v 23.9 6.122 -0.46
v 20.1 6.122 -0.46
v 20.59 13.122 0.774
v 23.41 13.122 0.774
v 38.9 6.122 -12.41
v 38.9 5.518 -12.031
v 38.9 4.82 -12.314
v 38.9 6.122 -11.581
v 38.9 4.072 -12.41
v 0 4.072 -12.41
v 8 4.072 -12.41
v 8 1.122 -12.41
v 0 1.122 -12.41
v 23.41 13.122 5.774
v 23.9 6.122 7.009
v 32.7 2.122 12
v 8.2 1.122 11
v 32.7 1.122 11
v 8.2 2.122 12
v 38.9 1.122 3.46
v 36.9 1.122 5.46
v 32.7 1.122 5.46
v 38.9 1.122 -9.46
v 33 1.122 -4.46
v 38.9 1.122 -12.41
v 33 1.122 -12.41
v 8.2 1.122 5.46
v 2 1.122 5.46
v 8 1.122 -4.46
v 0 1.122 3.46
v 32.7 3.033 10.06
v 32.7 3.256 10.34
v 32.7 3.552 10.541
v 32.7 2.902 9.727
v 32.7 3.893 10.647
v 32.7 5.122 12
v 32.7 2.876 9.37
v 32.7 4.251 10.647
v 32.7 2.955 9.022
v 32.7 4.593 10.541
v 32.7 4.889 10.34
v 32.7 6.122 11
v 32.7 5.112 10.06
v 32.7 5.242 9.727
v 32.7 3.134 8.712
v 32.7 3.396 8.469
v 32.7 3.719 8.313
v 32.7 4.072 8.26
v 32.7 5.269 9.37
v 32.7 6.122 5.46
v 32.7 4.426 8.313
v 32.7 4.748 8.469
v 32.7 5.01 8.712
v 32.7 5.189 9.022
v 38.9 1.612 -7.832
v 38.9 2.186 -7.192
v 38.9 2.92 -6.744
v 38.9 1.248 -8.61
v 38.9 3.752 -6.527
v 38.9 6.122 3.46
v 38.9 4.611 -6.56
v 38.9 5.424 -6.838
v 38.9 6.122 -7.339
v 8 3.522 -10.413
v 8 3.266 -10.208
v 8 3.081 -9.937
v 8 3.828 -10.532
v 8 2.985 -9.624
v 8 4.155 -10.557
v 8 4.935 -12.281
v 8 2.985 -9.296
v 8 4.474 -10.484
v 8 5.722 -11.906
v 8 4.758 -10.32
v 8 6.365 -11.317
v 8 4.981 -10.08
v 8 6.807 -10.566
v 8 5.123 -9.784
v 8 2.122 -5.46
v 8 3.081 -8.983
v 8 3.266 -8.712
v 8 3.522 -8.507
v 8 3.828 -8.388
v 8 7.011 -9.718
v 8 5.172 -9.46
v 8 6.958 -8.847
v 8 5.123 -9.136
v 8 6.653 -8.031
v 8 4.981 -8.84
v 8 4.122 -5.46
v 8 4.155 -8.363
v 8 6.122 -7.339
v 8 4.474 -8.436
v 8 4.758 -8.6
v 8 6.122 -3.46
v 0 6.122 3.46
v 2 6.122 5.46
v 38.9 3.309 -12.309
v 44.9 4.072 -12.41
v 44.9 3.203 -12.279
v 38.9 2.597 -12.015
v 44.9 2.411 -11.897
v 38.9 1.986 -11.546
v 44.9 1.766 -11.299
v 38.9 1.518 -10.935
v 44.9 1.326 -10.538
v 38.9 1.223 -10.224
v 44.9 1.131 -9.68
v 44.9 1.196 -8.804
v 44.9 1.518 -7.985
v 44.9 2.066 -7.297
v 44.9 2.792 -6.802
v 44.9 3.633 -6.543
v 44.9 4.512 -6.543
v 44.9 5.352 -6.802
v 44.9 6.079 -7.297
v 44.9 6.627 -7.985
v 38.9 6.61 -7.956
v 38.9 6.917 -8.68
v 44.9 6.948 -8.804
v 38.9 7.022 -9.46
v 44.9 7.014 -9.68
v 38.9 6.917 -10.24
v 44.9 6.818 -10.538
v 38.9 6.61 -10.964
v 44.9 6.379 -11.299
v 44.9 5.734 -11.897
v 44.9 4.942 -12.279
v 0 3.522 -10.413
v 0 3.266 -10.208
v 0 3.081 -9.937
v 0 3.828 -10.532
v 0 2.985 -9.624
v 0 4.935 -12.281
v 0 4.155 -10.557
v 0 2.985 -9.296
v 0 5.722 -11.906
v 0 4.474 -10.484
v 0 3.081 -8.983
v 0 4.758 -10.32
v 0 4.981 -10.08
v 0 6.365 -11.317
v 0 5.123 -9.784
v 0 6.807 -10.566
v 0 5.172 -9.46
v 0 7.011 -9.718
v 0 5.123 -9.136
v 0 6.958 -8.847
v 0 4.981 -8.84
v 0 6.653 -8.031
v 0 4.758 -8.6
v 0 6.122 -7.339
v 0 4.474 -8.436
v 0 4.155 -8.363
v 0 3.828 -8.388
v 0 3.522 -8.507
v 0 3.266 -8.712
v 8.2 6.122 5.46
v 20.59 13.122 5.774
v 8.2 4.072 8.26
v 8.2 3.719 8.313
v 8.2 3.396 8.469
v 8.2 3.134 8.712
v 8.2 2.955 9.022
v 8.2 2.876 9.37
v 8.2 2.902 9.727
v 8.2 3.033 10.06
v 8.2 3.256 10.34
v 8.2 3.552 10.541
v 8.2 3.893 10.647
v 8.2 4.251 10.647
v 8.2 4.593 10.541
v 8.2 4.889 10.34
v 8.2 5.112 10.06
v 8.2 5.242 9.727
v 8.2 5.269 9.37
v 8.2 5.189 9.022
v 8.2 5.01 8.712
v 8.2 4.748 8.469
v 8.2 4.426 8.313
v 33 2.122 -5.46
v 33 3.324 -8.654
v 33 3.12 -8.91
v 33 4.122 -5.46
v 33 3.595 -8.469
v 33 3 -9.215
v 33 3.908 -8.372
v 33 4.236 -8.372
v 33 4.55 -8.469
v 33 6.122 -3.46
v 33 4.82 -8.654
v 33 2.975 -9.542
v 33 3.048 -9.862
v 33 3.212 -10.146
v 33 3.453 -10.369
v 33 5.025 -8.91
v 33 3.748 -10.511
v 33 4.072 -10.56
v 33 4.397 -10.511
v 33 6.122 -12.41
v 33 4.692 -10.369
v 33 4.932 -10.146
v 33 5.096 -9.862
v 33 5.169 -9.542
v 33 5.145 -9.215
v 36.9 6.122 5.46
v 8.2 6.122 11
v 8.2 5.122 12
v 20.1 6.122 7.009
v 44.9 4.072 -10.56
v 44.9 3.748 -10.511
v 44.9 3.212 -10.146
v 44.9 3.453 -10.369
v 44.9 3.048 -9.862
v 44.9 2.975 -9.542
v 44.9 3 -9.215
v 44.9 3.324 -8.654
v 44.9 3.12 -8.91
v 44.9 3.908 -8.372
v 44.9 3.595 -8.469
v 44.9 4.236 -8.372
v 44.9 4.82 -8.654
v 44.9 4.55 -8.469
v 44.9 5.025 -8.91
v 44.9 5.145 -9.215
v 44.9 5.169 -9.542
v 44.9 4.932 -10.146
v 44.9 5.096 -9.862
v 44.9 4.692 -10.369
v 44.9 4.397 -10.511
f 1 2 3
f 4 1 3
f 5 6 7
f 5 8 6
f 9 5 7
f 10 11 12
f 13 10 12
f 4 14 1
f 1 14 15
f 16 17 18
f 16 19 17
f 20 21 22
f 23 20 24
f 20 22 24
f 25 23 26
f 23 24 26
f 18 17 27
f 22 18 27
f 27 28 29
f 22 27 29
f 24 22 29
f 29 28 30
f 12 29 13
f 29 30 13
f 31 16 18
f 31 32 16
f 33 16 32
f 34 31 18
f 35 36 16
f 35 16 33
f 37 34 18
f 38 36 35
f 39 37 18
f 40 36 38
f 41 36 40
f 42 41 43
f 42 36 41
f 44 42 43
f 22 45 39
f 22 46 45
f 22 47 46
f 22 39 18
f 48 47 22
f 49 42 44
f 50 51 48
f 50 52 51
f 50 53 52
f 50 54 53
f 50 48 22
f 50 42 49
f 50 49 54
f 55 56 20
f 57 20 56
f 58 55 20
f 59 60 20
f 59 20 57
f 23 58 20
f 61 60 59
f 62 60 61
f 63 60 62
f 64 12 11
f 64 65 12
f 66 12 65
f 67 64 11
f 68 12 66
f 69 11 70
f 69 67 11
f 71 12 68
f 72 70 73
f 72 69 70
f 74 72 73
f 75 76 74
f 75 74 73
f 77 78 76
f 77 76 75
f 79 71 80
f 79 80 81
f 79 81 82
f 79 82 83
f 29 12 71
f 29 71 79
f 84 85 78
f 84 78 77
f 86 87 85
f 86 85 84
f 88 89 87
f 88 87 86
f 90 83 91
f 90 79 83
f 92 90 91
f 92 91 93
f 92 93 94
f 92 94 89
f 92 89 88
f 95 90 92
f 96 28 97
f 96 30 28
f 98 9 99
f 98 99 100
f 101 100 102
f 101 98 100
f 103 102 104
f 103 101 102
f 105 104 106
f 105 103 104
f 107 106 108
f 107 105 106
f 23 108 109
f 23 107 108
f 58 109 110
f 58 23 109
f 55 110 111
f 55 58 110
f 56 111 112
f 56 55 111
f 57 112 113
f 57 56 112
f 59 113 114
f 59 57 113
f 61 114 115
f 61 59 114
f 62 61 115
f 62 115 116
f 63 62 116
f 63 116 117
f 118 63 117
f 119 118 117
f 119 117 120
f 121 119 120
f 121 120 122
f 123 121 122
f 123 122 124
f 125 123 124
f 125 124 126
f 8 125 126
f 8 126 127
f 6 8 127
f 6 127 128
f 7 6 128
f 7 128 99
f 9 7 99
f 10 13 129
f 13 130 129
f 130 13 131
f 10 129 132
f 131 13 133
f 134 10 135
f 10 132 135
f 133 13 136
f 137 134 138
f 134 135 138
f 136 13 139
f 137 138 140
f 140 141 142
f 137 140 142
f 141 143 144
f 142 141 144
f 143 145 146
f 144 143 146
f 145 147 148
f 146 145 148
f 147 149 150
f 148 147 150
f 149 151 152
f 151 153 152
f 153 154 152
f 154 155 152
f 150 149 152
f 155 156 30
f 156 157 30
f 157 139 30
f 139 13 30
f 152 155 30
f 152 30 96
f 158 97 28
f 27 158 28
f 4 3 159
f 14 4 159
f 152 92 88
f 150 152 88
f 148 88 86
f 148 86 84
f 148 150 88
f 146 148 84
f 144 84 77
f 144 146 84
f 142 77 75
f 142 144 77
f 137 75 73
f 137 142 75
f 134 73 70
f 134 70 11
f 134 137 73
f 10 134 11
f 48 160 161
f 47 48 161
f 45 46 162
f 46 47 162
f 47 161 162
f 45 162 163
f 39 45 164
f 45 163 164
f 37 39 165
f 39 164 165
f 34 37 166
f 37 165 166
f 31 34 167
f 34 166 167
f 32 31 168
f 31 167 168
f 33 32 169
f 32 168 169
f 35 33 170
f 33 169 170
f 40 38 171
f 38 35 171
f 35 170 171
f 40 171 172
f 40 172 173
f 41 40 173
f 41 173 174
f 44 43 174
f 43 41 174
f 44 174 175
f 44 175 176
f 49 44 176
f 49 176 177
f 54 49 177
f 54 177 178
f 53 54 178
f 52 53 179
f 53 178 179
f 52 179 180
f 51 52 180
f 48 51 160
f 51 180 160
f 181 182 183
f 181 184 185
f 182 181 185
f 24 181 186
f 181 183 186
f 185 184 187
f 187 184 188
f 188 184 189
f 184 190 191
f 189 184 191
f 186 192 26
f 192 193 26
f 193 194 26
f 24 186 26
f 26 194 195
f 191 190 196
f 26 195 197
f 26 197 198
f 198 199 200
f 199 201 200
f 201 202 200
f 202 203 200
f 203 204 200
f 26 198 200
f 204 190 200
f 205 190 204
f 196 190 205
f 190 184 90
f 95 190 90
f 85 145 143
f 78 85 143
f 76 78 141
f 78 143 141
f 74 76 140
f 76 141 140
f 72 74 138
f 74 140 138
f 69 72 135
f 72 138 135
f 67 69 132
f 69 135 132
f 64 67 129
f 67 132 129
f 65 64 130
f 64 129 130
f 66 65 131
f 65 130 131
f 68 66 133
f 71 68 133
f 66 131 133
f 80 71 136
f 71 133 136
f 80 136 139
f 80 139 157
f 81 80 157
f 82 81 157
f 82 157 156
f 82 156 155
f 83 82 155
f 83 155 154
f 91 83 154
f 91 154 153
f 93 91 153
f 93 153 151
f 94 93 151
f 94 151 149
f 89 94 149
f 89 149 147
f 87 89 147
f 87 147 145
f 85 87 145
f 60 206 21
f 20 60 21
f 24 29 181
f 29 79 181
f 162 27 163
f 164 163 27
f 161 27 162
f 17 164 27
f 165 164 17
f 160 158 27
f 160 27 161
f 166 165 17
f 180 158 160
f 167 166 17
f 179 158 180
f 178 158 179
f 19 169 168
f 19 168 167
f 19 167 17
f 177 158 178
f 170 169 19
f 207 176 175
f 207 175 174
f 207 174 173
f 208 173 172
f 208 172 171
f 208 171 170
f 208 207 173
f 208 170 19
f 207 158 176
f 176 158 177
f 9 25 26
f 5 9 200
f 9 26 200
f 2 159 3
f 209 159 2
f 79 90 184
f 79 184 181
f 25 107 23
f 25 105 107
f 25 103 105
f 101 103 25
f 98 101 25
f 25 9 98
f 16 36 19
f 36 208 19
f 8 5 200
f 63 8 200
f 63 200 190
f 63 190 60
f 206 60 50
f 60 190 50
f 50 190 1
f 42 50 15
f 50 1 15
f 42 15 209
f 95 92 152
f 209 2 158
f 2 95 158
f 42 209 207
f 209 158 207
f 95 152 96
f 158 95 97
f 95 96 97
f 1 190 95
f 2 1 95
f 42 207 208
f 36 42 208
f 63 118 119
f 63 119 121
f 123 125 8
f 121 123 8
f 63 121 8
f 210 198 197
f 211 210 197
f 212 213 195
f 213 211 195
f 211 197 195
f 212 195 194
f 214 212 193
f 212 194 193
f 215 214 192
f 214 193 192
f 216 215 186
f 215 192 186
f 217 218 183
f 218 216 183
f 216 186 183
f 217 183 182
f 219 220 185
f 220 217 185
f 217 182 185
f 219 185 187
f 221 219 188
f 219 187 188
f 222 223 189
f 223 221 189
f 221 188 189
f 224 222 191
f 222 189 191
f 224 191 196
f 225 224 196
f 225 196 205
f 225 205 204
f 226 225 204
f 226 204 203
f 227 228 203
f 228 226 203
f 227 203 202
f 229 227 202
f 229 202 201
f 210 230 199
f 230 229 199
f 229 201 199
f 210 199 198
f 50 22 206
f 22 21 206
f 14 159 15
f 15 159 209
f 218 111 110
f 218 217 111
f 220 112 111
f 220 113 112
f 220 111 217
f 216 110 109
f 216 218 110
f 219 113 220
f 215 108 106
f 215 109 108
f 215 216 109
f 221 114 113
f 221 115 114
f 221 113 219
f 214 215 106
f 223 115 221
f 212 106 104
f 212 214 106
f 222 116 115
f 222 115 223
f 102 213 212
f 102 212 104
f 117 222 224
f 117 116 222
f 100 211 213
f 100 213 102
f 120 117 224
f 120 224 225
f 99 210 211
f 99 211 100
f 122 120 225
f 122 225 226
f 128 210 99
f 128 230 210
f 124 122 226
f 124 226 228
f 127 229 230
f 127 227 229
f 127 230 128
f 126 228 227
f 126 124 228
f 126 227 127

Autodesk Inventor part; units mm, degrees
ref_plane "YZ Plane" through (0, 0, 0) normal (1, 0, 0) x (0, 1, 0)
ref_plane "XZ Plane" through (0, 0, 0) normal (0, 1, 0) x (-1, 0, 0)
ref_plane "XY Plane" through (0, 0, 0) normal (0, 0, 1) x (1, 0, 0)
sketch "草图1" plane through (0, 0, 0) normal (1, 0, 0) x (0, 1, 0)
  circle A0 centre (4.0723, -9.46) radius 2.95
  line L0 (16.324, 0) -> (-17.1797, 0)
  line L1 (1.1223, -9.46) -> (1.1223, 0)
  line L2 (6.1223, 0) -> (6.1223, -7.3387)
  circle A1 centre (4.0723, 9.46) radius 1.2
  line L3 (6.1223, 0) -> (6.1223, 11)
  line L4 (1.1223, 0) -> (1.1223, 12)
  line L5 (1.1223, 12) -> (5.1223, 12)
  circle A2 centre (4.0723, -9.46) radius 1.1
  line L6 (5.1223, 12) -> (6.1223, 11)
  line L7 (4.0723, -12.41) -> (1.1223, -12.41)
  line L8 (1.1223, -12.41) -> (1.1223, -9.46)
  point P0 (0, 0)
  dimension "d0" = 5.9
  dimension "d2" = 18.92
  dimension "d3" = 2.4
  dimension "d4" = 5
  dimension "d5" = 2.2
  dimension "d8" = 135
  dimension "d9" = 24
  dimension "d10" = 1
extrude "拉伸1" add sketch "草图1" along normal blind 8
sketch "草图2" plane through (8, 0, 0) normal (1, 0, 0) x (0, 0, -1)
  line L0 (-11, 6.1223) -> (-12, 5.1223) projected
  line L1 (-12, 5.1223) -> (-12, 1.1223) projected
  line L2 (-12, 1.1223) -> (12.41, 1.1223) projected
  line L3 (12.41, 1.1223) -> (12.41, 4.0723) projected
  arc A0 (12.41, 4.0723) -> (7.3387, 6.1223) centre (9.46, 4.0723) ccw projected
  line L4 (7.3387, 6.1223) -> (-11, 6.1223) projected
  circle A1 centre (9.46, 4.0723) radius 1.1 projected
  circle A2 centre (-9.46, 4.0723) radius 1.2 projected
  line L5 (7.3387, 6.1223) -> (-11, 6.1223) projected
  line L6 (5.46, 6.1223) -> (5.46, 1.1223)
  point P0 (0, 0)
  point P1 (5.46, 3.6223)
  dimension "d11" = 4
extrude "拉伸2" add sketch "草图2" along normal blind 25 contours L4 L6 L2 L1 L0
sketch "草图3" plane through (33, 0, 0) normal (1, 0, 0) x (0, 0, -1)
  line L0 (-12, 1.1223) -> (5.46, 1.1223) projected
  line L1 (5.46, 1.1223) -> (5.46, 6.1223) projected
  line L2 (5.46, 6.1223) -> (-11, 6.1223) projected
  line L3 (-11, 6.1223) -> (-12, 5.1223) projected
  line L4 (-12, 5.1223) -> (-12, 1.1223) projected
  circle A0 centre (-9.46, 4.0723) radius 1.2 projected
  line L5 (-12, 1.1223) -> (12.41, 1.1223) projected
  line L6 (5.46, 1.1223) -> (12.41, 1.1223)
  line L7 (12.41, 1.1223) -> (12.41, 6.1223)
  line L8 (12.41, 6.1223) -> (5.46, 6.1223)
  circle A1 centre (9.46, 4.0723) radius 1.1 projected
  arc A2 (12.41, 4.0723) -> (7.3387, 6.1223) centre (9.46, 4.0723) ccw projected
  point P0 (0, 0)
extrude "拉伸3" add sketch "草图3" along normal blind 5.9 contours L4 L3 L2 L1 L0 | L1 L8 A2 L7 L5 | A2 L8 L7
sketch "草图4" plane through (38.9, 0, 0) normal (1, 0, 0) x (0, 0, -1)
  circle A0 centre (9.46, 4.0723) radius 1.1 projected
  circle A1 centre (9.46, 4.0723) radius 2.95
  line L0 (-12, 1.1223) -> (12.41, 1.1223) projected
  point P0 (0, 0)
  point P1 (8.9146, 1.1223)
  point P2 (9.46, 1.1223)
  dimension "d16" = 5.9
extrude "拉伸4" add sketch "草图4" along normal blind 6
chamfer "倒角1" distance 2 angle 45 1 edges at (20.5, 6.1223, -5.46)
chamfer "倒角2" distance 1 angle 45 1 edges at (19.45, 1.1223, 12)
chamfer "倒角3" distance 1 angle 45 1 edges at (20.5, 1.1223, -5.46)
sketch "草图5" plane through (0, 0, 0) normal (-1, 0, 0) x (0, 0, 1)
  line L0 (-7.3387, 6.1223) -> (11, 6.1223) projected
  line L1 (5.46, 6.1223) -> (5.46, 1.1223)
  line L2 (11, 1.1223) -> (-12.41, 1.1223) projected
  circle A0 centre (9.46, 4.0723) radius 1.2 projected
  line L3 (12, 5.1223) -> (12, 2.1223) projected
  line L4 (11, 6.1223) -> (12, 5.1223) projected
  line L5 (12, 2.1223) -> (11, 1.1223) projected
  point P0 (0, 0)
  dimension "d28" = 4
extrude "拉伸5" cut sketch "草图5" against normal blind 8.2
sketch "草图6" plane through (38.9, 0, 0) normal (1, 0, 0) x (0, 0, -1)
  line L0 (-12, 5.1223) -> (-12, 2.1223) projected
  line L1 (-11, 6.1223) -> (-12, 5.1223) projected
  line L2 (-5.46, 6.1223) -> (-11, 6.1223) projected
  line L3 (-5.46, 1.1223) -> (-5.46, 6.1223) projected
  line L4 (-11, 1.1223) -> (-5.46, 1.1223) projected
  line L5 (-12, 2.1223) -> (-11, 1.1223) projected
  circle A0 centre (-9.46, 4.0723) radius 1.2 projected
  point P0 (0, 0)
extrude "拉伸6" cut sketch "草图6" against normal blind 6.2
chamfer "倒角5" distance 2 angle 45 2 edges at (38.9, 3.6223, 5.46) (0, 3.6223, 5.46)
ref_plane "工作平面1" through (20.1, 0, 0) normal (1, 0, 0) x (0, 0, -1)
sketch "草图7" plane through (20.1, 0, 0) normal (1, 0, 0) x (0, 0, -1)
  line L0 (7.3387, 6.1223) -> (-3.46, 6.1223) projected
  line L1 (0.46, 6.1223) -> (-0.7743, 13.1223)
  line L2 (-0.7743, 13.1223) -> (-5.7743, 13.1223)
  line L3 (-5.7743, 13.1223) -> (-7.0086, 6.1223)
  line L4 (-7.0086, 6.1223) -> (0.46, 6.1223)
  point P0 (0, 0)
  point P1 (7.2697, 6.1223)
  point P2 (3.46, 6.1223)
  point P3 (-3.46, 6.1223)
  dimension "d40" = 80
  dimension "d41" = 80
  dimension "d42" = 5
  dimension "d43" = 3
  dimension "d44" = 7
extrude "拉伸7" add sketch "草图7" along normal blind 3.8
sketch "草图8" plane through (8.2, 2.1223, 12) normal (0, 0, 1) x (1, 0, 0)
  line L0 (11.9, 11) -> (15.7, 11) projected
  line L1 (11.9, 11) -> (11.9, 4) projected
  line L2 (12.3895, 11) -> (11.9, 4)
  line L3 (15.7, 11) -> (15.7, 4) projected
  line L4 (15.2105, 11) -> (15.7, 4)
  line L5 (11.9, 4) -> (15.7, 4) projected
  line L6 (15.7, 4) -> (11.9, 4)
  point P0 (-8.2, -2.1223)
  dimension "d47" = 86
  dimension "d48" = 86
extrude "拉伸8" cut sketch "草图8" against normal blind 100 contours L0 L2 L1 | L0 L3 L4
properties part number "履带片"
